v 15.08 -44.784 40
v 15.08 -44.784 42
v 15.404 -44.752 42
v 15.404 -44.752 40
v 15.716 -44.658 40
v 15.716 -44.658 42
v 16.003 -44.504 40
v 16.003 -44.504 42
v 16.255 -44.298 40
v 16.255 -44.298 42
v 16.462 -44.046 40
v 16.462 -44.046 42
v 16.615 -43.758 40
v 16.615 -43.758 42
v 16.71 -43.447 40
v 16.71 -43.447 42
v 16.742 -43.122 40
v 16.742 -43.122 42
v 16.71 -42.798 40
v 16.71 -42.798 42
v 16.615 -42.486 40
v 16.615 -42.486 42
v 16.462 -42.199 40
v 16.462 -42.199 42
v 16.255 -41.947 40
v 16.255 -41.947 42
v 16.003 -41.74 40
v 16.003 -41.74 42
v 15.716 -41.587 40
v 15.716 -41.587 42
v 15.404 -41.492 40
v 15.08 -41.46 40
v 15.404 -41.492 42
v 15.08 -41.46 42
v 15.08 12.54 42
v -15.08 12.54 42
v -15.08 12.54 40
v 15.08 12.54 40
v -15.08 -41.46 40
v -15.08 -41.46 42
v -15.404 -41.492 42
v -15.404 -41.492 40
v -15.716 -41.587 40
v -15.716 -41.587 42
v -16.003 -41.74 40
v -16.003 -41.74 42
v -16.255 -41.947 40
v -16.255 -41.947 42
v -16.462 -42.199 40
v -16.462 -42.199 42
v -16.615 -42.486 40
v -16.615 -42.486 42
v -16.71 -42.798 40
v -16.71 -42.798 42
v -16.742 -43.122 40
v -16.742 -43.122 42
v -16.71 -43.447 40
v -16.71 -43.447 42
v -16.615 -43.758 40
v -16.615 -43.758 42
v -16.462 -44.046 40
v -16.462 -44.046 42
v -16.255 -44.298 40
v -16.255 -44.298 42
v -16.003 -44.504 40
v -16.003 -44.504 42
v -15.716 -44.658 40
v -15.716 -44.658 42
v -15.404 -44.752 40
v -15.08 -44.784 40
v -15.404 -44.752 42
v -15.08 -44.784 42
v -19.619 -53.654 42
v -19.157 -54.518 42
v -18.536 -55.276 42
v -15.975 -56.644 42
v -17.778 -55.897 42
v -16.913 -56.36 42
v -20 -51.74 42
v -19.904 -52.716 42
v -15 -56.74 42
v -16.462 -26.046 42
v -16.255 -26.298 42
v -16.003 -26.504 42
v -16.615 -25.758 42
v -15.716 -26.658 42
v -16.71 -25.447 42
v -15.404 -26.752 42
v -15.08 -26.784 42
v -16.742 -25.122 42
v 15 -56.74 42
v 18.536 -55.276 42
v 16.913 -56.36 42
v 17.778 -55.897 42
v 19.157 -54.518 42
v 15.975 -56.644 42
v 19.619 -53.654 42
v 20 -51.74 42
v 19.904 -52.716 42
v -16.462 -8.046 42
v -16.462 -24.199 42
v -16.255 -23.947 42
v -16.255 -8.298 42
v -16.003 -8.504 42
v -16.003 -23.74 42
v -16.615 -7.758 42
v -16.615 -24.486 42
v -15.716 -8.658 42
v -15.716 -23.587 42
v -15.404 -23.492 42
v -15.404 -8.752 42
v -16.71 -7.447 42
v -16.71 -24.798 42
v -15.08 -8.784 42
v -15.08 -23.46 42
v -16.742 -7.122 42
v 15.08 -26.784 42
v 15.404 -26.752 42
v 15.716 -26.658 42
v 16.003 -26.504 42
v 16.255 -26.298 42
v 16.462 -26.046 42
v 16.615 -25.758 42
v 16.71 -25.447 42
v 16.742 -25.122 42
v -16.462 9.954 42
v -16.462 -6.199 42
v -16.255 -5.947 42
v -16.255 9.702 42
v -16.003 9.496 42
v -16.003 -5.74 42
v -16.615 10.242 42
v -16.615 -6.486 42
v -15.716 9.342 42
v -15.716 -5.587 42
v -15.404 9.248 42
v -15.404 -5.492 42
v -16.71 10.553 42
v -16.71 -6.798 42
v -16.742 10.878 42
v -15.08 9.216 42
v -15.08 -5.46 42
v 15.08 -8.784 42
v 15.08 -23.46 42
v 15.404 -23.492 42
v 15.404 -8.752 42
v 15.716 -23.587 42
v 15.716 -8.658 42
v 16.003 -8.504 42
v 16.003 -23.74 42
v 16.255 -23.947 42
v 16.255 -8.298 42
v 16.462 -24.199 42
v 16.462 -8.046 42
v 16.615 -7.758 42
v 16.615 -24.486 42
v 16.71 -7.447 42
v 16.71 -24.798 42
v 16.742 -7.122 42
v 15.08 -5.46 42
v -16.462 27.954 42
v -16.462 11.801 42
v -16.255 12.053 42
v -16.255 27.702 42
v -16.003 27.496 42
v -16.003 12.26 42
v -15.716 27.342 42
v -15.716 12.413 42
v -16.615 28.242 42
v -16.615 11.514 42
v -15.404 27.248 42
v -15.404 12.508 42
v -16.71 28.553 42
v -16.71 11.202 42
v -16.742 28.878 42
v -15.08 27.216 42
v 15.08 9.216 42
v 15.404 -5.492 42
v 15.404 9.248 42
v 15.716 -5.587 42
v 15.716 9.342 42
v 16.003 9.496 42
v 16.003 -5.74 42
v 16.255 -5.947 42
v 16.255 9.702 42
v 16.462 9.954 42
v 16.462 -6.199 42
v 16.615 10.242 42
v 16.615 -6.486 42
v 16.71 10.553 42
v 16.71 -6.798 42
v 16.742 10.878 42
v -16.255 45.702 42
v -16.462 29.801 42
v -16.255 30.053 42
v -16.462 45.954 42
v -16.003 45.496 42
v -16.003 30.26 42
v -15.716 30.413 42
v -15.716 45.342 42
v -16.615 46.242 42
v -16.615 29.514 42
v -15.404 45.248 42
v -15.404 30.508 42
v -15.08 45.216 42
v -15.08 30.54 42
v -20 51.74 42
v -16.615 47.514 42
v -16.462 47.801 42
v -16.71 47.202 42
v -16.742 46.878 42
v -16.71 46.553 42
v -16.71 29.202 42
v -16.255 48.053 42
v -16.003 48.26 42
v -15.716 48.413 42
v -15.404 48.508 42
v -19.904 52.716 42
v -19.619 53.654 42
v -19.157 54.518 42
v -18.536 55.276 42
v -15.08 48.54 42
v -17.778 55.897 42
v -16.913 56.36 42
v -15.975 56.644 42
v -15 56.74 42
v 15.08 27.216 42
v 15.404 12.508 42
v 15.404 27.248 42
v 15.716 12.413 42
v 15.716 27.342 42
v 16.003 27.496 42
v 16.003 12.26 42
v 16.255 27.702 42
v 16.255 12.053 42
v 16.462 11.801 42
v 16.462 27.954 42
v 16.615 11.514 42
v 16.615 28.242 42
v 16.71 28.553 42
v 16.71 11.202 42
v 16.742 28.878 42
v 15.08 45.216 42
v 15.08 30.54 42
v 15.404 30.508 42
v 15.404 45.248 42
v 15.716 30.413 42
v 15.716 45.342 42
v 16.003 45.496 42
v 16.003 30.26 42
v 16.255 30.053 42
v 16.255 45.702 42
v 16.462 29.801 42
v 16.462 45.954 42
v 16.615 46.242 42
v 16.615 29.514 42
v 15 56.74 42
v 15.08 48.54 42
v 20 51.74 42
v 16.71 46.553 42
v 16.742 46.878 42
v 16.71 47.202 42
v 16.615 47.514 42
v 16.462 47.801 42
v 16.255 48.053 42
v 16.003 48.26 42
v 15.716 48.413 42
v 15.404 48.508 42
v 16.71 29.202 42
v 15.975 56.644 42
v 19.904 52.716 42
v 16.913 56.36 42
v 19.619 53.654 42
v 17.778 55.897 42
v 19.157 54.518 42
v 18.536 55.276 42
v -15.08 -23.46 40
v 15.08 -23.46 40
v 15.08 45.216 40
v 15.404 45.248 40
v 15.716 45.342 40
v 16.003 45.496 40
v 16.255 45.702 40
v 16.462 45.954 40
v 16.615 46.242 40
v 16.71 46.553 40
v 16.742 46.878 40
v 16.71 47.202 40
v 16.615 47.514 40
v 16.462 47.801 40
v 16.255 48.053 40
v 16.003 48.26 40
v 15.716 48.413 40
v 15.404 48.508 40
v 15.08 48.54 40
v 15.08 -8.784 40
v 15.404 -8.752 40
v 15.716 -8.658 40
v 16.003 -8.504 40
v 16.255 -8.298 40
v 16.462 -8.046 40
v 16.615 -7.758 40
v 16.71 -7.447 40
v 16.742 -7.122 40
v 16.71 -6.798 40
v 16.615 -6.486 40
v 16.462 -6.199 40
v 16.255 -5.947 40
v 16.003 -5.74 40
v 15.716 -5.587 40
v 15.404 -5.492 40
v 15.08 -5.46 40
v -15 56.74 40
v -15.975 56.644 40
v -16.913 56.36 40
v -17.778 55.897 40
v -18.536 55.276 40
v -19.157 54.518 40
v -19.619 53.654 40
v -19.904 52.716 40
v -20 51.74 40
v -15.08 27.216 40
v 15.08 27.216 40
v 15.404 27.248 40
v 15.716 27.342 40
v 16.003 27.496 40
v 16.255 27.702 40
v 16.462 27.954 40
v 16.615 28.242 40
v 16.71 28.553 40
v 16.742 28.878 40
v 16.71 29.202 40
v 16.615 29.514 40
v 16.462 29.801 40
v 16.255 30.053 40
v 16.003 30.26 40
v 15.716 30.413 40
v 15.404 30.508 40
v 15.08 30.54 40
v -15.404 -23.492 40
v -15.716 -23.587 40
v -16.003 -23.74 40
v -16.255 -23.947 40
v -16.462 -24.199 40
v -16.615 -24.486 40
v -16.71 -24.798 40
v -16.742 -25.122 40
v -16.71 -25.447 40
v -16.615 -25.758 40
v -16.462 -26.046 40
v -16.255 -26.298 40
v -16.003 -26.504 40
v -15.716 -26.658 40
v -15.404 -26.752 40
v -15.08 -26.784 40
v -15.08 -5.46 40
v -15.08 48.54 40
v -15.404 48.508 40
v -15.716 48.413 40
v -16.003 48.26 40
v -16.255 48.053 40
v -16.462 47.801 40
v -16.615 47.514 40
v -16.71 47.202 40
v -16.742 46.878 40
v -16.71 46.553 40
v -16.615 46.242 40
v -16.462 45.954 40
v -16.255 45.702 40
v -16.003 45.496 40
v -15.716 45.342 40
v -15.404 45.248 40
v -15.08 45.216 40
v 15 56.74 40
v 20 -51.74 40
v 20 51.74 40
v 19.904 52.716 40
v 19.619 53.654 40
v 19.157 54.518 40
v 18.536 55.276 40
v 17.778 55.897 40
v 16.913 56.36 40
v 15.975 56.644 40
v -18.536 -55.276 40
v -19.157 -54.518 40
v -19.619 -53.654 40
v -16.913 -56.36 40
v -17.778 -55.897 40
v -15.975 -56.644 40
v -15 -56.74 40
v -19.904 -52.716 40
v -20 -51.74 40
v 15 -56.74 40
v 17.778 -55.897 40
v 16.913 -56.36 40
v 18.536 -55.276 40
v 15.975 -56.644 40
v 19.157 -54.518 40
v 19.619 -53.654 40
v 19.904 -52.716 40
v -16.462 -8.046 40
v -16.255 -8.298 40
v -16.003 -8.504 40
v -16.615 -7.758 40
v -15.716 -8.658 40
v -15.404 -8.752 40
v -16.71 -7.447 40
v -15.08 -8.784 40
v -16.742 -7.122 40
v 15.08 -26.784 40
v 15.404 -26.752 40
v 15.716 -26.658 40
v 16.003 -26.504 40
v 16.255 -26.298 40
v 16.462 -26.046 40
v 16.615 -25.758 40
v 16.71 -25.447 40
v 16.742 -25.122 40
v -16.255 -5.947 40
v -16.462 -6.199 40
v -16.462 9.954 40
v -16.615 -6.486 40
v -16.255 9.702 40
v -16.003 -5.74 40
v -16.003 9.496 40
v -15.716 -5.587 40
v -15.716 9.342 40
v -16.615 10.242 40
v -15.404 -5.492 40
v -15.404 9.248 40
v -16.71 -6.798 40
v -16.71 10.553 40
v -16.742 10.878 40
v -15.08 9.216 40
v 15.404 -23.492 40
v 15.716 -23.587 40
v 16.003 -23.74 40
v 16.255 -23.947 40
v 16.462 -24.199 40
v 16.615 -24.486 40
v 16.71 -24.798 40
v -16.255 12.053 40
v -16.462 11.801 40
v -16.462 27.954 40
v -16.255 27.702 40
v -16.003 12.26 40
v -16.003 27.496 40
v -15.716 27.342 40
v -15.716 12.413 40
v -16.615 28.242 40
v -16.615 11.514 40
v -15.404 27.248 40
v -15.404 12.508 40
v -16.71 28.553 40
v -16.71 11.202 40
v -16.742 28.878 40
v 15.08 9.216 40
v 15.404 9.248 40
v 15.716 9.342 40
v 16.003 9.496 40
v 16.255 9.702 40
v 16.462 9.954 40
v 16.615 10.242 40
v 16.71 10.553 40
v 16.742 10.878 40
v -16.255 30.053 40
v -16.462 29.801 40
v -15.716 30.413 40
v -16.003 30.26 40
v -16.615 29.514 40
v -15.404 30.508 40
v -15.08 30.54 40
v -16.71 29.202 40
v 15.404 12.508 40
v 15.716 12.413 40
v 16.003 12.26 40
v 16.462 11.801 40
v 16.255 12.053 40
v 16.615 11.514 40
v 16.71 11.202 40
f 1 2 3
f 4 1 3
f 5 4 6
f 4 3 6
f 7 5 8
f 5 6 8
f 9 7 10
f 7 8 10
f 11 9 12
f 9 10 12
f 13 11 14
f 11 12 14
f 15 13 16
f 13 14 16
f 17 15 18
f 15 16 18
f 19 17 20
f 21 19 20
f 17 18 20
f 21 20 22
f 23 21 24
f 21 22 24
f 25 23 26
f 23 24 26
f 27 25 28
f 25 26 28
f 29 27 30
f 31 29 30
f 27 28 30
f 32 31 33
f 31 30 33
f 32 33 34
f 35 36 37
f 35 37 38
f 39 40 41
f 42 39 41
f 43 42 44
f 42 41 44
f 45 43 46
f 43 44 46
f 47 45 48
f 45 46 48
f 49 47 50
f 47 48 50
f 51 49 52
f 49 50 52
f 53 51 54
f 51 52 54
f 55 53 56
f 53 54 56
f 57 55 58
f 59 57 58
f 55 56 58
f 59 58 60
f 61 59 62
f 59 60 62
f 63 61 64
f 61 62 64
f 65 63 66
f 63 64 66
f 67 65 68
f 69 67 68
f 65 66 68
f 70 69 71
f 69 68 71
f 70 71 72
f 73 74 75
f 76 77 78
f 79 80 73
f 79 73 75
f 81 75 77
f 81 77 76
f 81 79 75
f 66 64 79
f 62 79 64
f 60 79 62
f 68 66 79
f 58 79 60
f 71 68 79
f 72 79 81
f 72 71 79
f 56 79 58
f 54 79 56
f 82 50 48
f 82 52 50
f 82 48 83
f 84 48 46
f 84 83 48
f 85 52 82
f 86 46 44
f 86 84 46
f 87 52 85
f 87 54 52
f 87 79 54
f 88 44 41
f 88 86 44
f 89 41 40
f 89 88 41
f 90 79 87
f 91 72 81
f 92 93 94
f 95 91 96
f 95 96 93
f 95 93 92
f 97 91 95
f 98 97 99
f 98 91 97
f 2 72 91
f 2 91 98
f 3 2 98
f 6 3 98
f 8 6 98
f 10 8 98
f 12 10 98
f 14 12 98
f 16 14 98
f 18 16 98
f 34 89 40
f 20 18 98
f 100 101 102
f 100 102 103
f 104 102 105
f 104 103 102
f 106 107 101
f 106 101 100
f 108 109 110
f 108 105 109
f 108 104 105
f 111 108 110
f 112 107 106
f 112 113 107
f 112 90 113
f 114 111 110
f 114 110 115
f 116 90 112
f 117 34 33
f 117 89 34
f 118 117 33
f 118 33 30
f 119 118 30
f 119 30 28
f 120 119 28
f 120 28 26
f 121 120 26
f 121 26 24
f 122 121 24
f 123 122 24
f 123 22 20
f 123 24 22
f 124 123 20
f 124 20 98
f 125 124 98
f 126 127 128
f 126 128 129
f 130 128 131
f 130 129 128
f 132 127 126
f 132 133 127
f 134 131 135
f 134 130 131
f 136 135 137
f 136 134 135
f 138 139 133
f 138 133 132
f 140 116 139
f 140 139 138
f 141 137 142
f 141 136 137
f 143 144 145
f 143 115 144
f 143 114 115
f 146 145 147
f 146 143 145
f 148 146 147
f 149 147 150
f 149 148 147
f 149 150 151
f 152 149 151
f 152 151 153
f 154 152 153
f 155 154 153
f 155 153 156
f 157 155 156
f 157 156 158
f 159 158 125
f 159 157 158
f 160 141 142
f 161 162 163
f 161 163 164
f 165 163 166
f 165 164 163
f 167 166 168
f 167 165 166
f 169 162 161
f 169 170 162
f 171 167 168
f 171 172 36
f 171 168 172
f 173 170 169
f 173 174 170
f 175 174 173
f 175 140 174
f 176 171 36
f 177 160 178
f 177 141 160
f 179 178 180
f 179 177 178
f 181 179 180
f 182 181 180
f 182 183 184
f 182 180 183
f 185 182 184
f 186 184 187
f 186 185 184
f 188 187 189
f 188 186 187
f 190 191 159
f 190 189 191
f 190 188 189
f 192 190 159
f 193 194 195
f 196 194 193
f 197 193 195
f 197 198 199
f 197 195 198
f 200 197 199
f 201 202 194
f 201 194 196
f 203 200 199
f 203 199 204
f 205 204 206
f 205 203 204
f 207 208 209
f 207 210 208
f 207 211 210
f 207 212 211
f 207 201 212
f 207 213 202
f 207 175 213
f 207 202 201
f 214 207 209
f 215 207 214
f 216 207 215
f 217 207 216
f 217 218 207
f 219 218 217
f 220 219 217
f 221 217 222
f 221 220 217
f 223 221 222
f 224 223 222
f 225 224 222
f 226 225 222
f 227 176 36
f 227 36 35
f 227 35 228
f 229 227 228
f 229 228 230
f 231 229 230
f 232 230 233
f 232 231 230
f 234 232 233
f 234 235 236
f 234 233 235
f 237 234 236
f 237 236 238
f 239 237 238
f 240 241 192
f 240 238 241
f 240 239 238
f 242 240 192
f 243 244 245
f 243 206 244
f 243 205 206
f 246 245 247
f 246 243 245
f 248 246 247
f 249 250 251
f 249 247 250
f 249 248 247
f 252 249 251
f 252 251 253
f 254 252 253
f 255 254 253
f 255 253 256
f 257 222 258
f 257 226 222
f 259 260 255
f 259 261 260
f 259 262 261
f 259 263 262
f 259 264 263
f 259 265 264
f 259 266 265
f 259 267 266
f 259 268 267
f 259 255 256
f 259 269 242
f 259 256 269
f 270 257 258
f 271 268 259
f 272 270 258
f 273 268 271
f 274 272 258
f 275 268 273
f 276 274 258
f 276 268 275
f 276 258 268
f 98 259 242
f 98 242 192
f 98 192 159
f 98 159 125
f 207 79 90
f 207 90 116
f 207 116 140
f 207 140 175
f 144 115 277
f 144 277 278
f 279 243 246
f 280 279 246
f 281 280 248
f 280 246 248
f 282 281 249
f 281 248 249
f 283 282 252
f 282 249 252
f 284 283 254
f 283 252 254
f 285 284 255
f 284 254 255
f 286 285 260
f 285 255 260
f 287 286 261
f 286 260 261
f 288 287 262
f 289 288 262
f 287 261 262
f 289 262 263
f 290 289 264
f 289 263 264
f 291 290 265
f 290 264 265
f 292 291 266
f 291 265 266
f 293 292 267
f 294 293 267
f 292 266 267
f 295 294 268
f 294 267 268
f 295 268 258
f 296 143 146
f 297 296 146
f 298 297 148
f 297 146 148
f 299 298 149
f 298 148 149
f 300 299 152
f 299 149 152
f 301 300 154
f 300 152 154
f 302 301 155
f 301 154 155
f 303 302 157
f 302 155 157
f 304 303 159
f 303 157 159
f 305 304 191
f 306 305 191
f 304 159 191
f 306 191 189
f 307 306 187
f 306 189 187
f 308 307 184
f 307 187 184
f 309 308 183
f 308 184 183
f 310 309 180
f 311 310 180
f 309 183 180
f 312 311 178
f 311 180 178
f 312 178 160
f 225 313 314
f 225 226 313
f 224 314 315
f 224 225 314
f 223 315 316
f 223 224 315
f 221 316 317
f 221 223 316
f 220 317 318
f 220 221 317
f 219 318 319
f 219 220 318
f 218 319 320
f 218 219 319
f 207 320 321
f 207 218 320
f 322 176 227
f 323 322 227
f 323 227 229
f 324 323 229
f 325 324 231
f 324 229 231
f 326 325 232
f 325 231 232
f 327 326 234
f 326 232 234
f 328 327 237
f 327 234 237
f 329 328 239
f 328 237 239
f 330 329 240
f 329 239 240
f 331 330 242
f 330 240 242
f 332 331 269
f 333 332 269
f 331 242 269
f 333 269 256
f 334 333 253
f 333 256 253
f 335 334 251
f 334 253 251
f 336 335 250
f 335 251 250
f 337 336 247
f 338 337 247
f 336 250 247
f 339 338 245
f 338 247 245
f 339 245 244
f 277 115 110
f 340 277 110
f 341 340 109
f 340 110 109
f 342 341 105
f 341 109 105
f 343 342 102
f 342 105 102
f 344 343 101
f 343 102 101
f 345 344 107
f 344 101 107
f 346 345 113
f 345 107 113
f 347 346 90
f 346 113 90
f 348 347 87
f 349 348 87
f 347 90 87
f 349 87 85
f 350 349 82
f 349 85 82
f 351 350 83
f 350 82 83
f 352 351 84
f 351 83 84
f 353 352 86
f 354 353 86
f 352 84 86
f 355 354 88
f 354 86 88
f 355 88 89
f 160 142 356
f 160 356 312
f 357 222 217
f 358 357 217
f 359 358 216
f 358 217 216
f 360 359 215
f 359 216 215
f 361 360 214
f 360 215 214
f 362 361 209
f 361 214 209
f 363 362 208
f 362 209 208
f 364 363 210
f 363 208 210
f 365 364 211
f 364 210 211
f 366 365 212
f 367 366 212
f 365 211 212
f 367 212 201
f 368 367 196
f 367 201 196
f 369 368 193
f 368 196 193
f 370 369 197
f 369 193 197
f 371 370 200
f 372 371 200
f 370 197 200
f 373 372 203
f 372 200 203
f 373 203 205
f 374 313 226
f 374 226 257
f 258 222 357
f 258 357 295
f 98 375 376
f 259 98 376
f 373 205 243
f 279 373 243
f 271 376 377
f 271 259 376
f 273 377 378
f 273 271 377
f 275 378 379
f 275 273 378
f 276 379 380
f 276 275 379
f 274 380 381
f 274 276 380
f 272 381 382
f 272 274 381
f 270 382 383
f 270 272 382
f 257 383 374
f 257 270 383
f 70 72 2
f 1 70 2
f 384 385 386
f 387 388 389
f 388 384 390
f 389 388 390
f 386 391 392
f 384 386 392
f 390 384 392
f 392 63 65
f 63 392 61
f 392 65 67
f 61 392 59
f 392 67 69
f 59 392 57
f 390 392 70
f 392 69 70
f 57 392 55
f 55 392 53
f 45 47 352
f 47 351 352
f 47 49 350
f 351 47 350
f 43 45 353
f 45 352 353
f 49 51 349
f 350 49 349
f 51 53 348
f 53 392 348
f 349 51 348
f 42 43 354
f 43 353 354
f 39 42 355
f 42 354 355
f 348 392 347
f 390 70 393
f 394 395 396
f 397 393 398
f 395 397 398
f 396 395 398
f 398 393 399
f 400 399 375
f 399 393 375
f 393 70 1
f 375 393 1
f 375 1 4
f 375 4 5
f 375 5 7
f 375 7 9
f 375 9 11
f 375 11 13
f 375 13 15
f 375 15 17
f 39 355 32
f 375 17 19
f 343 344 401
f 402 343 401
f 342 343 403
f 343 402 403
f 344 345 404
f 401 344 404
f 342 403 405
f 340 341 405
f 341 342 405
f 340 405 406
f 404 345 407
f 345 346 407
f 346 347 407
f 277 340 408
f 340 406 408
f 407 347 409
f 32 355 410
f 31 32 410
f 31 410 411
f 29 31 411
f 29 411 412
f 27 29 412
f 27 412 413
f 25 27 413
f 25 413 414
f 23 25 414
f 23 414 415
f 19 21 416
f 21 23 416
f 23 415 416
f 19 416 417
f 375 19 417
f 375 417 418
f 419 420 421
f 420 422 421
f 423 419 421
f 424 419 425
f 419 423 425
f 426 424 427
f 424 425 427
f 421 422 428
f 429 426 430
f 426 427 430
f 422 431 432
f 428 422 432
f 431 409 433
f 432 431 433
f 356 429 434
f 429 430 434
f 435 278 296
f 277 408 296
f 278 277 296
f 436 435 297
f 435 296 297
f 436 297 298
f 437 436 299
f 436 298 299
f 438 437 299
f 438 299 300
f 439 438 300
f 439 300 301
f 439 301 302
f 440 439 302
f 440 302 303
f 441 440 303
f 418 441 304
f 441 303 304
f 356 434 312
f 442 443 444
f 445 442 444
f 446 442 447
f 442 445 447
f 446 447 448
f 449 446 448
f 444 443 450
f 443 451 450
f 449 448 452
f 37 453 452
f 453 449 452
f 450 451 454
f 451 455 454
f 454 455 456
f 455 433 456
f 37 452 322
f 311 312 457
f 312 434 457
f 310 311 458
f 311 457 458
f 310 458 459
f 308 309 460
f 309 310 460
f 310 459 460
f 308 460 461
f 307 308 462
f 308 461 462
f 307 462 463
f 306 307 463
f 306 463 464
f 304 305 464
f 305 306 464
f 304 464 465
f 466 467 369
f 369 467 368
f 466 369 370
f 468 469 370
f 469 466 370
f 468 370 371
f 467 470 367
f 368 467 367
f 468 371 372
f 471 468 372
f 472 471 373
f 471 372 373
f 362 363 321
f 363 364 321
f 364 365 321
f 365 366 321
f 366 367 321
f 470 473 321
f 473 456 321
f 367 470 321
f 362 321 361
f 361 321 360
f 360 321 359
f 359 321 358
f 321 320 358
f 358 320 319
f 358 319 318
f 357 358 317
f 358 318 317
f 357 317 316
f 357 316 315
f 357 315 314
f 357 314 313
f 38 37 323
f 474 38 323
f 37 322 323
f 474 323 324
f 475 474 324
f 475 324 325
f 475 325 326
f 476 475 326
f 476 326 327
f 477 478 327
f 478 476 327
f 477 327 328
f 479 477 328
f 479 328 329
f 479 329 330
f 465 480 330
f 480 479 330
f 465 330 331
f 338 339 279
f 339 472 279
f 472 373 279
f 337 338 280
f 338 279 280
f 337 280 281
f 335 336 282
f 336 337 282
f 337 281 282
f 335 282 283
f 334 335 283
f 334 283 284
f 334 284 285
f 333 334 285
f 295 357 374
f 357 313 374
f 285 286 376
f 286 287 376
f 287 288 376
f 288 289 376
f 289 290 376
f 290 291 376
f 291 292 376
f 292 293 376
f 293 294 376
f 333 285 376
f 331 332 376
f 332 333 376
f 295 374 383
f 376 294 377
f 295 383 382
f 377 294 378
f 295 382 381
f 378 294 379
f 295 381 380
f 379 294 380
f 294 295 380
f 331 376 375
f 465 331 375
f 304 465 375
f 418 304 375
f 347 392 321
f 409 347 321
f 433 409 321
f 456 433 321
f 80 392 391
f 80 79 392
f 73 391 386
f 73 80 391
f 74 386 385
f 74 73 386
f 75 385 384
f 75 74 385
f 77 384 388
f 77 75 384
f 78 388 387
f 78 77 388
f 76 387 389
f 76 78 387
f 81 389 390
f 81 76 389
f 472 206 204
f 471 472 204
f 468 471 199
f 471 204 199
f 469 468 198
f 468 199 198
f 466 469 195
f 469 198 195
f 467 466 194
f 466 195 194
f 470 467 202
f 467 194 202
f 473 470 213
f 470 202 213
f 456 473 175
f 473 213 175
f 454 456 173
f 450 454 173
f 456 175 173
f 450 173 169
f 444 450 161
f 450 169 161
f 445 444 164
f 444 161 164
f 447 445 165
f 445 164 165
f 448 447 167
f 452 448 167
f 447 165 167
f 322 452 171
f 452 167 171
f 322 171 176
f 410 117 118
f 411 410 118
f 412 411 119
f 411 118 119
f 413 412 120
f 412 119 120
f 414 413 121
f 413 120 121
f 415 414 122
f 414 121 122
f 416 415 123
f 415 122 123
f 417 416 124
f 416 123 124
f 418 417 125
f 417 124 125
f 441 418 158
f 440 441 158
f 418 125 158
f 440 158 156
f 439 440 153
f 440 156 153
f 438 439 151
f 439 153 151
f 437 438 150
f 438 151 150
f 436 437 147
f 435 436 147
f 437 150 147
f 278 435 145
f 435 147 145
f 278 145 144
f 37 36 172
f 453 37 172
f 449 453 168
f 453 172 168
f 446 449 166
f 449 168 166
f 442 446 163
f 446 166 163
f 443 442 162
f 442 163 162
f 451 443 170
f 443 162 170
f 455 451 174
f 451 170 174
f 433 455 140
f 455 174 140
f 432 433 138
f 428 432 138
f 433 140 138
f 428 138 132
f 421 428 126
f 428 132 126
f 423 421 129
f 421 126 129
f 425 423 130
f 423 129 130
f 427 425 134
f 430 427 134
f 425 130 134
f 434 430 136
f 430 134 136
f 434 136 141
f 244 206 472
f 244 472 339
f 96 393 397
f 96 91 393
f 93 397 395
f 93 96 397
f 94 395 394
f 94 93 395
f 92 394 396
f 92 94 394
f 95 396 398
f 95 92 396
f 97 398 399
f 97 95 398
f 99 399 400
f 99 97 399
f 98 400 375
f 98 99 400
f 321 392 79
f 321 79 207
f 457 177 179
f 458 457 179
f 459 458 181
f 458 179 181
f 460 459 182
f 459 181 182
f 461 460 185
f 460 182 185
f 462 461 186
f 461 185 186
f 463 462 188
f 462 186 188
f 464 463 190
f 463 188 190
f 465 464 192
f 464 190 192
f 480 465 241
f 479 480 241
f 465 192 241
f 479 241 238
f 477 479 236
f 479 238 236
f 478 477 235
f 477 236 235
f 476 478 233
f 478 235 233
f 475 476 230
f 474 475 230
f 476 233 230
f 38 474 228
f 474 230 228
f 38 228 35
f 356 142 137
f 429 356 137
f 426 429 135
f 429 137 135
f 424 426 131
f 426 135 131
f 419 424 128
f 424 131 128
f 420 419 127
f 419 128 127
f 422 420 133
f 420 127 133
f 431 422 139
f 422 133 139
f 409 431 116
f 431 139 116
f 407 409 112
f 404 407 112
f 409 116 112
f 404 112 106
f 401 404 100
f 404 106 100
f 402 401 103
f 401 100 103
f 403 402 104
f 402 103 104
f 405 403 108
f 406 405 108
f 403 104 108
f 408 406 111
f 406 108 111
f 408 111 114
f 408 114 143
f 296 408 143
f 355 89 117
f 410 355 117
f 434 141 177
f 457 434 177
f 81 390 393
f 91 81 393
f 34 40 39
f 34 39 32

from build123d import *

# Parameters (mm, degrees)
SKETCH006_W            = 40
SKETCH006_H            = 113.480256
PAD001_DEPTH           = 2
FILLET_R               = 5
FILLET001_R            = 5
FILLET002_R            = 5
FILLET003_R            = 5
POCKET003_DEPTH        = 242.68144
LINEARPATTERN001_COUNT = 6
LINEARPATTERN001_PITCH = 18


with BuildPart() as part:
    # Sketch006 → Pad001 (new body)
    with BuildSketch(Plane.XY.offset(40)):
        Rectangle(SKETCH006_W, SKETCH006_H)
    extrude(amount=PAD001_DEPTH)

    # Fillet
    fillet_edges = [part.edges().sort_by_distance(p)[0] for p in [
        (20, 56.740128, 41),
    ]]
    fillet(fillet_edges, radius=FILLET_R)

    # Fillet001
    fillet001_edges = [part.edges().sort_by_distance(p)[0] for p in [
        (-20, 56.740128, 41),
    ]]
    fillet(fillet001_edges, radius=FILLET001_R)

    # Fillet002
    fillet002_edges = [part.edges().sort_by_distance(p)[0] for p in [
        (-20, -56.740128, 41),
    ]]
    fillet(fillet002_edges, radius=FILLET002_R)

    # Fillet003
    fillet003_edges = [part.edges().sort_by_distance(p)[0] for p in [
        (20, -56.740128, 41),
    ]]
    fillet(fillet003_edges, radius=FILLET003_R)

    # Sketch007 → Pocket003 (cut, through all)
    with BuildSketch(Plane.XY.offset(42)):
        with BuildLine():
            ThreePointArc((-15.079723, 48.539704), (-16.741783, 46.877644), (-15.079723, 45.215584))
            Line((-15.079723, 45.215584), (15.079723, 45.215584))
            ThreePointArc((15.079723, 45.215584), (16.741783, 46.877644), (15.079723, 48.539704))
            Line((-15.079723, 48.539704), (15.079723, 48.539704))
        make_face()
    pocket003 = extrude(amount=-POCKET003_DEPTH, mode=Mode.SUBTRACT)

    # LinearPattern001: Pocket003 ×6
    with Locations(*[(0, -i * LINEARPATTERN001_PITCH, 0) for i in range(1, LINEARPATTERN001_COUNT)]):
        add(pocket003, mode=Mode.SUBTRACT)


solid = part.part
